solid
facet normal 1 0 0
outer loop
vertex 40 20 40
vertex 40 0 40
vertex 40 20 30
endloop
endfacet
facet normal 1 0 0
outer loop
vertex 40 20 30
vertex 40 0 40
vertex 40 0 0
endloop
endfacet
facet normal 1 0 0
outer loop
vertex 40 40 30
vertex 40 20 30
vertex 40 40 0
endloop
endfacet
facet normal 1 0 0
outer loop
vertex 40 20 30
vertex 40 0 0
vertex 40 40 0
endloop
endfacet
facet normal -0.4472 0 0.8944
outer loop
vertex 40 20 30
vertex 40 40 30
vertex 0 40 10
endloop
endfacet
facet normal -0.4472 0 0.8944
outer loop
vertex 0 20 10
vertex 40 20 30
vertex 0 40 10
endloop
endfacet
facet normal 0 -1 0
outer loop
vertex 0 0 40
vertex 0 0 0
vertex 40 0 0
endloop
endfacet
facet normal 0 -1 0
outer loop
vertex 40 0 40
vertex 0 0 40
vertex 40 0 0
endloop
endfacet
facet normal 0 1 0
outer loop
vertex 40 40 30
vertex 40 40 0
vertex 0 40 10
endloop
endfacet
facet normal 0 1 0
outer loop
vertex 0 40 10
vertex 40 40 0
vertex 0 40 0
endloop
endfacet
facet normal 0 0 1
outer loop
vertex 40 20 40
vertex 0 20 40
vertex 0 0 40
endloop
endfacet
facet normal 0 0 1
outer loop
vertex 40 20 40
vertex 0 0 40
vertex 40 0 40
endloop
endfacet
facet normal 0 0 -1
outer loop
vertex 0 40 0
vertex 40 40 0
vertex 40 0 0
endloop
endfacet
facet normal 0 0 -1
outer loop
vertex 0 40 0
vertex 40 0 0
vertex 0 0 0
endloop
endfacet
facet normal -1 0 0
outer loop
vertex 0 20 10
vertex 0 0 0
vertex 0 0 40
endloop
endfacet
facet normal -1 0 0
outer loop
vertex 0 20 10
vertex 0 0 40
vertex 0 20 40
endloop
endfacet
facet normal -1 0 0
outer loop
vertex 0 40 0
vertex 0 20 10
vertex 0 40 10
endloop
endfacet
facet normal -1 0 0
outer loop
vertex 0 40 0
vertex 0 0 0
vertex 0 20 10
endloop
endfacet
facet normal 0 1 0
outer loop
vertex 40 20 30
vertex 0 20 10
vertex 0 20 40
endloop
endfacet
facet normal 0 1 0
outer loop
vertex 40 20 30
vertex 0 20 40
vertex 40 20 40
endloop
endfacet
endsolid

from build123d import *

# Parameters (mm, degrees)
SKETCH1_W           = 40
SKETCH1_H           = 40
BOSS_EXTRUDE1_DEPTH = 40
SKETCH2_W           = 10
SKETCH2_H           = 20
CUT_EXTRUDE1_DEPTH  = 40
CUT_EXTRUDE2_DEPTH  = 20
SKETCH4_W           = 40
SKETCH4_H           = 20
BOSS_EXTRUDE2_DEPTH = 10


with BuildPart() as part:
    # Sketch1 → Boss-Extrude1 (new body)
    with BuildSketch(Plane.XY):
        with Locations((20, 20)):
            Rectangle(SKETCH1_W, SKETCH1_H)
    extrude(amount=BOSS_EXTRUDE1_DEPTH)

    # Sketch2 → Cut-Extrude1 (cut)
    with BuildSketch(Plane.ZY):
        with Locations((5, 30)):
            Rectangle(SKETCH2_W, SKETCH2_H)
    extrude(amount=-CUT_EXTRUDE1_DEPTH, mode=Mode.SUBTRACT)

    # Sketch3 → Cut-Extrude2 (cut)
    with BuildSketch(Plane(origin=(0, 40, 0), x_dir=(1, 0, 0), z_dir=(0, 1, 0))):
        Polygon((40, -30), (0, -10), (0, -40), (40, -40), align=None)
    extrude(amount=-CUT_EXTRUDE2_DEPTH, mode=Mode.SUBTRACT)

    # Sketch4 → Boss-Extrude2 (add)
    with BuildSketch(Plane(origin=(0, 0, 0), x_dir=(-1, 0, 0), z_dir=(0, 0, -1))):
        with Locations((-20, 30)):
            Rectangle(SKETCH4_W, SKETCH4_H)
    extrude(amount=-BOSS_EXTRUDE2_DEPTH)


solid = part.part
